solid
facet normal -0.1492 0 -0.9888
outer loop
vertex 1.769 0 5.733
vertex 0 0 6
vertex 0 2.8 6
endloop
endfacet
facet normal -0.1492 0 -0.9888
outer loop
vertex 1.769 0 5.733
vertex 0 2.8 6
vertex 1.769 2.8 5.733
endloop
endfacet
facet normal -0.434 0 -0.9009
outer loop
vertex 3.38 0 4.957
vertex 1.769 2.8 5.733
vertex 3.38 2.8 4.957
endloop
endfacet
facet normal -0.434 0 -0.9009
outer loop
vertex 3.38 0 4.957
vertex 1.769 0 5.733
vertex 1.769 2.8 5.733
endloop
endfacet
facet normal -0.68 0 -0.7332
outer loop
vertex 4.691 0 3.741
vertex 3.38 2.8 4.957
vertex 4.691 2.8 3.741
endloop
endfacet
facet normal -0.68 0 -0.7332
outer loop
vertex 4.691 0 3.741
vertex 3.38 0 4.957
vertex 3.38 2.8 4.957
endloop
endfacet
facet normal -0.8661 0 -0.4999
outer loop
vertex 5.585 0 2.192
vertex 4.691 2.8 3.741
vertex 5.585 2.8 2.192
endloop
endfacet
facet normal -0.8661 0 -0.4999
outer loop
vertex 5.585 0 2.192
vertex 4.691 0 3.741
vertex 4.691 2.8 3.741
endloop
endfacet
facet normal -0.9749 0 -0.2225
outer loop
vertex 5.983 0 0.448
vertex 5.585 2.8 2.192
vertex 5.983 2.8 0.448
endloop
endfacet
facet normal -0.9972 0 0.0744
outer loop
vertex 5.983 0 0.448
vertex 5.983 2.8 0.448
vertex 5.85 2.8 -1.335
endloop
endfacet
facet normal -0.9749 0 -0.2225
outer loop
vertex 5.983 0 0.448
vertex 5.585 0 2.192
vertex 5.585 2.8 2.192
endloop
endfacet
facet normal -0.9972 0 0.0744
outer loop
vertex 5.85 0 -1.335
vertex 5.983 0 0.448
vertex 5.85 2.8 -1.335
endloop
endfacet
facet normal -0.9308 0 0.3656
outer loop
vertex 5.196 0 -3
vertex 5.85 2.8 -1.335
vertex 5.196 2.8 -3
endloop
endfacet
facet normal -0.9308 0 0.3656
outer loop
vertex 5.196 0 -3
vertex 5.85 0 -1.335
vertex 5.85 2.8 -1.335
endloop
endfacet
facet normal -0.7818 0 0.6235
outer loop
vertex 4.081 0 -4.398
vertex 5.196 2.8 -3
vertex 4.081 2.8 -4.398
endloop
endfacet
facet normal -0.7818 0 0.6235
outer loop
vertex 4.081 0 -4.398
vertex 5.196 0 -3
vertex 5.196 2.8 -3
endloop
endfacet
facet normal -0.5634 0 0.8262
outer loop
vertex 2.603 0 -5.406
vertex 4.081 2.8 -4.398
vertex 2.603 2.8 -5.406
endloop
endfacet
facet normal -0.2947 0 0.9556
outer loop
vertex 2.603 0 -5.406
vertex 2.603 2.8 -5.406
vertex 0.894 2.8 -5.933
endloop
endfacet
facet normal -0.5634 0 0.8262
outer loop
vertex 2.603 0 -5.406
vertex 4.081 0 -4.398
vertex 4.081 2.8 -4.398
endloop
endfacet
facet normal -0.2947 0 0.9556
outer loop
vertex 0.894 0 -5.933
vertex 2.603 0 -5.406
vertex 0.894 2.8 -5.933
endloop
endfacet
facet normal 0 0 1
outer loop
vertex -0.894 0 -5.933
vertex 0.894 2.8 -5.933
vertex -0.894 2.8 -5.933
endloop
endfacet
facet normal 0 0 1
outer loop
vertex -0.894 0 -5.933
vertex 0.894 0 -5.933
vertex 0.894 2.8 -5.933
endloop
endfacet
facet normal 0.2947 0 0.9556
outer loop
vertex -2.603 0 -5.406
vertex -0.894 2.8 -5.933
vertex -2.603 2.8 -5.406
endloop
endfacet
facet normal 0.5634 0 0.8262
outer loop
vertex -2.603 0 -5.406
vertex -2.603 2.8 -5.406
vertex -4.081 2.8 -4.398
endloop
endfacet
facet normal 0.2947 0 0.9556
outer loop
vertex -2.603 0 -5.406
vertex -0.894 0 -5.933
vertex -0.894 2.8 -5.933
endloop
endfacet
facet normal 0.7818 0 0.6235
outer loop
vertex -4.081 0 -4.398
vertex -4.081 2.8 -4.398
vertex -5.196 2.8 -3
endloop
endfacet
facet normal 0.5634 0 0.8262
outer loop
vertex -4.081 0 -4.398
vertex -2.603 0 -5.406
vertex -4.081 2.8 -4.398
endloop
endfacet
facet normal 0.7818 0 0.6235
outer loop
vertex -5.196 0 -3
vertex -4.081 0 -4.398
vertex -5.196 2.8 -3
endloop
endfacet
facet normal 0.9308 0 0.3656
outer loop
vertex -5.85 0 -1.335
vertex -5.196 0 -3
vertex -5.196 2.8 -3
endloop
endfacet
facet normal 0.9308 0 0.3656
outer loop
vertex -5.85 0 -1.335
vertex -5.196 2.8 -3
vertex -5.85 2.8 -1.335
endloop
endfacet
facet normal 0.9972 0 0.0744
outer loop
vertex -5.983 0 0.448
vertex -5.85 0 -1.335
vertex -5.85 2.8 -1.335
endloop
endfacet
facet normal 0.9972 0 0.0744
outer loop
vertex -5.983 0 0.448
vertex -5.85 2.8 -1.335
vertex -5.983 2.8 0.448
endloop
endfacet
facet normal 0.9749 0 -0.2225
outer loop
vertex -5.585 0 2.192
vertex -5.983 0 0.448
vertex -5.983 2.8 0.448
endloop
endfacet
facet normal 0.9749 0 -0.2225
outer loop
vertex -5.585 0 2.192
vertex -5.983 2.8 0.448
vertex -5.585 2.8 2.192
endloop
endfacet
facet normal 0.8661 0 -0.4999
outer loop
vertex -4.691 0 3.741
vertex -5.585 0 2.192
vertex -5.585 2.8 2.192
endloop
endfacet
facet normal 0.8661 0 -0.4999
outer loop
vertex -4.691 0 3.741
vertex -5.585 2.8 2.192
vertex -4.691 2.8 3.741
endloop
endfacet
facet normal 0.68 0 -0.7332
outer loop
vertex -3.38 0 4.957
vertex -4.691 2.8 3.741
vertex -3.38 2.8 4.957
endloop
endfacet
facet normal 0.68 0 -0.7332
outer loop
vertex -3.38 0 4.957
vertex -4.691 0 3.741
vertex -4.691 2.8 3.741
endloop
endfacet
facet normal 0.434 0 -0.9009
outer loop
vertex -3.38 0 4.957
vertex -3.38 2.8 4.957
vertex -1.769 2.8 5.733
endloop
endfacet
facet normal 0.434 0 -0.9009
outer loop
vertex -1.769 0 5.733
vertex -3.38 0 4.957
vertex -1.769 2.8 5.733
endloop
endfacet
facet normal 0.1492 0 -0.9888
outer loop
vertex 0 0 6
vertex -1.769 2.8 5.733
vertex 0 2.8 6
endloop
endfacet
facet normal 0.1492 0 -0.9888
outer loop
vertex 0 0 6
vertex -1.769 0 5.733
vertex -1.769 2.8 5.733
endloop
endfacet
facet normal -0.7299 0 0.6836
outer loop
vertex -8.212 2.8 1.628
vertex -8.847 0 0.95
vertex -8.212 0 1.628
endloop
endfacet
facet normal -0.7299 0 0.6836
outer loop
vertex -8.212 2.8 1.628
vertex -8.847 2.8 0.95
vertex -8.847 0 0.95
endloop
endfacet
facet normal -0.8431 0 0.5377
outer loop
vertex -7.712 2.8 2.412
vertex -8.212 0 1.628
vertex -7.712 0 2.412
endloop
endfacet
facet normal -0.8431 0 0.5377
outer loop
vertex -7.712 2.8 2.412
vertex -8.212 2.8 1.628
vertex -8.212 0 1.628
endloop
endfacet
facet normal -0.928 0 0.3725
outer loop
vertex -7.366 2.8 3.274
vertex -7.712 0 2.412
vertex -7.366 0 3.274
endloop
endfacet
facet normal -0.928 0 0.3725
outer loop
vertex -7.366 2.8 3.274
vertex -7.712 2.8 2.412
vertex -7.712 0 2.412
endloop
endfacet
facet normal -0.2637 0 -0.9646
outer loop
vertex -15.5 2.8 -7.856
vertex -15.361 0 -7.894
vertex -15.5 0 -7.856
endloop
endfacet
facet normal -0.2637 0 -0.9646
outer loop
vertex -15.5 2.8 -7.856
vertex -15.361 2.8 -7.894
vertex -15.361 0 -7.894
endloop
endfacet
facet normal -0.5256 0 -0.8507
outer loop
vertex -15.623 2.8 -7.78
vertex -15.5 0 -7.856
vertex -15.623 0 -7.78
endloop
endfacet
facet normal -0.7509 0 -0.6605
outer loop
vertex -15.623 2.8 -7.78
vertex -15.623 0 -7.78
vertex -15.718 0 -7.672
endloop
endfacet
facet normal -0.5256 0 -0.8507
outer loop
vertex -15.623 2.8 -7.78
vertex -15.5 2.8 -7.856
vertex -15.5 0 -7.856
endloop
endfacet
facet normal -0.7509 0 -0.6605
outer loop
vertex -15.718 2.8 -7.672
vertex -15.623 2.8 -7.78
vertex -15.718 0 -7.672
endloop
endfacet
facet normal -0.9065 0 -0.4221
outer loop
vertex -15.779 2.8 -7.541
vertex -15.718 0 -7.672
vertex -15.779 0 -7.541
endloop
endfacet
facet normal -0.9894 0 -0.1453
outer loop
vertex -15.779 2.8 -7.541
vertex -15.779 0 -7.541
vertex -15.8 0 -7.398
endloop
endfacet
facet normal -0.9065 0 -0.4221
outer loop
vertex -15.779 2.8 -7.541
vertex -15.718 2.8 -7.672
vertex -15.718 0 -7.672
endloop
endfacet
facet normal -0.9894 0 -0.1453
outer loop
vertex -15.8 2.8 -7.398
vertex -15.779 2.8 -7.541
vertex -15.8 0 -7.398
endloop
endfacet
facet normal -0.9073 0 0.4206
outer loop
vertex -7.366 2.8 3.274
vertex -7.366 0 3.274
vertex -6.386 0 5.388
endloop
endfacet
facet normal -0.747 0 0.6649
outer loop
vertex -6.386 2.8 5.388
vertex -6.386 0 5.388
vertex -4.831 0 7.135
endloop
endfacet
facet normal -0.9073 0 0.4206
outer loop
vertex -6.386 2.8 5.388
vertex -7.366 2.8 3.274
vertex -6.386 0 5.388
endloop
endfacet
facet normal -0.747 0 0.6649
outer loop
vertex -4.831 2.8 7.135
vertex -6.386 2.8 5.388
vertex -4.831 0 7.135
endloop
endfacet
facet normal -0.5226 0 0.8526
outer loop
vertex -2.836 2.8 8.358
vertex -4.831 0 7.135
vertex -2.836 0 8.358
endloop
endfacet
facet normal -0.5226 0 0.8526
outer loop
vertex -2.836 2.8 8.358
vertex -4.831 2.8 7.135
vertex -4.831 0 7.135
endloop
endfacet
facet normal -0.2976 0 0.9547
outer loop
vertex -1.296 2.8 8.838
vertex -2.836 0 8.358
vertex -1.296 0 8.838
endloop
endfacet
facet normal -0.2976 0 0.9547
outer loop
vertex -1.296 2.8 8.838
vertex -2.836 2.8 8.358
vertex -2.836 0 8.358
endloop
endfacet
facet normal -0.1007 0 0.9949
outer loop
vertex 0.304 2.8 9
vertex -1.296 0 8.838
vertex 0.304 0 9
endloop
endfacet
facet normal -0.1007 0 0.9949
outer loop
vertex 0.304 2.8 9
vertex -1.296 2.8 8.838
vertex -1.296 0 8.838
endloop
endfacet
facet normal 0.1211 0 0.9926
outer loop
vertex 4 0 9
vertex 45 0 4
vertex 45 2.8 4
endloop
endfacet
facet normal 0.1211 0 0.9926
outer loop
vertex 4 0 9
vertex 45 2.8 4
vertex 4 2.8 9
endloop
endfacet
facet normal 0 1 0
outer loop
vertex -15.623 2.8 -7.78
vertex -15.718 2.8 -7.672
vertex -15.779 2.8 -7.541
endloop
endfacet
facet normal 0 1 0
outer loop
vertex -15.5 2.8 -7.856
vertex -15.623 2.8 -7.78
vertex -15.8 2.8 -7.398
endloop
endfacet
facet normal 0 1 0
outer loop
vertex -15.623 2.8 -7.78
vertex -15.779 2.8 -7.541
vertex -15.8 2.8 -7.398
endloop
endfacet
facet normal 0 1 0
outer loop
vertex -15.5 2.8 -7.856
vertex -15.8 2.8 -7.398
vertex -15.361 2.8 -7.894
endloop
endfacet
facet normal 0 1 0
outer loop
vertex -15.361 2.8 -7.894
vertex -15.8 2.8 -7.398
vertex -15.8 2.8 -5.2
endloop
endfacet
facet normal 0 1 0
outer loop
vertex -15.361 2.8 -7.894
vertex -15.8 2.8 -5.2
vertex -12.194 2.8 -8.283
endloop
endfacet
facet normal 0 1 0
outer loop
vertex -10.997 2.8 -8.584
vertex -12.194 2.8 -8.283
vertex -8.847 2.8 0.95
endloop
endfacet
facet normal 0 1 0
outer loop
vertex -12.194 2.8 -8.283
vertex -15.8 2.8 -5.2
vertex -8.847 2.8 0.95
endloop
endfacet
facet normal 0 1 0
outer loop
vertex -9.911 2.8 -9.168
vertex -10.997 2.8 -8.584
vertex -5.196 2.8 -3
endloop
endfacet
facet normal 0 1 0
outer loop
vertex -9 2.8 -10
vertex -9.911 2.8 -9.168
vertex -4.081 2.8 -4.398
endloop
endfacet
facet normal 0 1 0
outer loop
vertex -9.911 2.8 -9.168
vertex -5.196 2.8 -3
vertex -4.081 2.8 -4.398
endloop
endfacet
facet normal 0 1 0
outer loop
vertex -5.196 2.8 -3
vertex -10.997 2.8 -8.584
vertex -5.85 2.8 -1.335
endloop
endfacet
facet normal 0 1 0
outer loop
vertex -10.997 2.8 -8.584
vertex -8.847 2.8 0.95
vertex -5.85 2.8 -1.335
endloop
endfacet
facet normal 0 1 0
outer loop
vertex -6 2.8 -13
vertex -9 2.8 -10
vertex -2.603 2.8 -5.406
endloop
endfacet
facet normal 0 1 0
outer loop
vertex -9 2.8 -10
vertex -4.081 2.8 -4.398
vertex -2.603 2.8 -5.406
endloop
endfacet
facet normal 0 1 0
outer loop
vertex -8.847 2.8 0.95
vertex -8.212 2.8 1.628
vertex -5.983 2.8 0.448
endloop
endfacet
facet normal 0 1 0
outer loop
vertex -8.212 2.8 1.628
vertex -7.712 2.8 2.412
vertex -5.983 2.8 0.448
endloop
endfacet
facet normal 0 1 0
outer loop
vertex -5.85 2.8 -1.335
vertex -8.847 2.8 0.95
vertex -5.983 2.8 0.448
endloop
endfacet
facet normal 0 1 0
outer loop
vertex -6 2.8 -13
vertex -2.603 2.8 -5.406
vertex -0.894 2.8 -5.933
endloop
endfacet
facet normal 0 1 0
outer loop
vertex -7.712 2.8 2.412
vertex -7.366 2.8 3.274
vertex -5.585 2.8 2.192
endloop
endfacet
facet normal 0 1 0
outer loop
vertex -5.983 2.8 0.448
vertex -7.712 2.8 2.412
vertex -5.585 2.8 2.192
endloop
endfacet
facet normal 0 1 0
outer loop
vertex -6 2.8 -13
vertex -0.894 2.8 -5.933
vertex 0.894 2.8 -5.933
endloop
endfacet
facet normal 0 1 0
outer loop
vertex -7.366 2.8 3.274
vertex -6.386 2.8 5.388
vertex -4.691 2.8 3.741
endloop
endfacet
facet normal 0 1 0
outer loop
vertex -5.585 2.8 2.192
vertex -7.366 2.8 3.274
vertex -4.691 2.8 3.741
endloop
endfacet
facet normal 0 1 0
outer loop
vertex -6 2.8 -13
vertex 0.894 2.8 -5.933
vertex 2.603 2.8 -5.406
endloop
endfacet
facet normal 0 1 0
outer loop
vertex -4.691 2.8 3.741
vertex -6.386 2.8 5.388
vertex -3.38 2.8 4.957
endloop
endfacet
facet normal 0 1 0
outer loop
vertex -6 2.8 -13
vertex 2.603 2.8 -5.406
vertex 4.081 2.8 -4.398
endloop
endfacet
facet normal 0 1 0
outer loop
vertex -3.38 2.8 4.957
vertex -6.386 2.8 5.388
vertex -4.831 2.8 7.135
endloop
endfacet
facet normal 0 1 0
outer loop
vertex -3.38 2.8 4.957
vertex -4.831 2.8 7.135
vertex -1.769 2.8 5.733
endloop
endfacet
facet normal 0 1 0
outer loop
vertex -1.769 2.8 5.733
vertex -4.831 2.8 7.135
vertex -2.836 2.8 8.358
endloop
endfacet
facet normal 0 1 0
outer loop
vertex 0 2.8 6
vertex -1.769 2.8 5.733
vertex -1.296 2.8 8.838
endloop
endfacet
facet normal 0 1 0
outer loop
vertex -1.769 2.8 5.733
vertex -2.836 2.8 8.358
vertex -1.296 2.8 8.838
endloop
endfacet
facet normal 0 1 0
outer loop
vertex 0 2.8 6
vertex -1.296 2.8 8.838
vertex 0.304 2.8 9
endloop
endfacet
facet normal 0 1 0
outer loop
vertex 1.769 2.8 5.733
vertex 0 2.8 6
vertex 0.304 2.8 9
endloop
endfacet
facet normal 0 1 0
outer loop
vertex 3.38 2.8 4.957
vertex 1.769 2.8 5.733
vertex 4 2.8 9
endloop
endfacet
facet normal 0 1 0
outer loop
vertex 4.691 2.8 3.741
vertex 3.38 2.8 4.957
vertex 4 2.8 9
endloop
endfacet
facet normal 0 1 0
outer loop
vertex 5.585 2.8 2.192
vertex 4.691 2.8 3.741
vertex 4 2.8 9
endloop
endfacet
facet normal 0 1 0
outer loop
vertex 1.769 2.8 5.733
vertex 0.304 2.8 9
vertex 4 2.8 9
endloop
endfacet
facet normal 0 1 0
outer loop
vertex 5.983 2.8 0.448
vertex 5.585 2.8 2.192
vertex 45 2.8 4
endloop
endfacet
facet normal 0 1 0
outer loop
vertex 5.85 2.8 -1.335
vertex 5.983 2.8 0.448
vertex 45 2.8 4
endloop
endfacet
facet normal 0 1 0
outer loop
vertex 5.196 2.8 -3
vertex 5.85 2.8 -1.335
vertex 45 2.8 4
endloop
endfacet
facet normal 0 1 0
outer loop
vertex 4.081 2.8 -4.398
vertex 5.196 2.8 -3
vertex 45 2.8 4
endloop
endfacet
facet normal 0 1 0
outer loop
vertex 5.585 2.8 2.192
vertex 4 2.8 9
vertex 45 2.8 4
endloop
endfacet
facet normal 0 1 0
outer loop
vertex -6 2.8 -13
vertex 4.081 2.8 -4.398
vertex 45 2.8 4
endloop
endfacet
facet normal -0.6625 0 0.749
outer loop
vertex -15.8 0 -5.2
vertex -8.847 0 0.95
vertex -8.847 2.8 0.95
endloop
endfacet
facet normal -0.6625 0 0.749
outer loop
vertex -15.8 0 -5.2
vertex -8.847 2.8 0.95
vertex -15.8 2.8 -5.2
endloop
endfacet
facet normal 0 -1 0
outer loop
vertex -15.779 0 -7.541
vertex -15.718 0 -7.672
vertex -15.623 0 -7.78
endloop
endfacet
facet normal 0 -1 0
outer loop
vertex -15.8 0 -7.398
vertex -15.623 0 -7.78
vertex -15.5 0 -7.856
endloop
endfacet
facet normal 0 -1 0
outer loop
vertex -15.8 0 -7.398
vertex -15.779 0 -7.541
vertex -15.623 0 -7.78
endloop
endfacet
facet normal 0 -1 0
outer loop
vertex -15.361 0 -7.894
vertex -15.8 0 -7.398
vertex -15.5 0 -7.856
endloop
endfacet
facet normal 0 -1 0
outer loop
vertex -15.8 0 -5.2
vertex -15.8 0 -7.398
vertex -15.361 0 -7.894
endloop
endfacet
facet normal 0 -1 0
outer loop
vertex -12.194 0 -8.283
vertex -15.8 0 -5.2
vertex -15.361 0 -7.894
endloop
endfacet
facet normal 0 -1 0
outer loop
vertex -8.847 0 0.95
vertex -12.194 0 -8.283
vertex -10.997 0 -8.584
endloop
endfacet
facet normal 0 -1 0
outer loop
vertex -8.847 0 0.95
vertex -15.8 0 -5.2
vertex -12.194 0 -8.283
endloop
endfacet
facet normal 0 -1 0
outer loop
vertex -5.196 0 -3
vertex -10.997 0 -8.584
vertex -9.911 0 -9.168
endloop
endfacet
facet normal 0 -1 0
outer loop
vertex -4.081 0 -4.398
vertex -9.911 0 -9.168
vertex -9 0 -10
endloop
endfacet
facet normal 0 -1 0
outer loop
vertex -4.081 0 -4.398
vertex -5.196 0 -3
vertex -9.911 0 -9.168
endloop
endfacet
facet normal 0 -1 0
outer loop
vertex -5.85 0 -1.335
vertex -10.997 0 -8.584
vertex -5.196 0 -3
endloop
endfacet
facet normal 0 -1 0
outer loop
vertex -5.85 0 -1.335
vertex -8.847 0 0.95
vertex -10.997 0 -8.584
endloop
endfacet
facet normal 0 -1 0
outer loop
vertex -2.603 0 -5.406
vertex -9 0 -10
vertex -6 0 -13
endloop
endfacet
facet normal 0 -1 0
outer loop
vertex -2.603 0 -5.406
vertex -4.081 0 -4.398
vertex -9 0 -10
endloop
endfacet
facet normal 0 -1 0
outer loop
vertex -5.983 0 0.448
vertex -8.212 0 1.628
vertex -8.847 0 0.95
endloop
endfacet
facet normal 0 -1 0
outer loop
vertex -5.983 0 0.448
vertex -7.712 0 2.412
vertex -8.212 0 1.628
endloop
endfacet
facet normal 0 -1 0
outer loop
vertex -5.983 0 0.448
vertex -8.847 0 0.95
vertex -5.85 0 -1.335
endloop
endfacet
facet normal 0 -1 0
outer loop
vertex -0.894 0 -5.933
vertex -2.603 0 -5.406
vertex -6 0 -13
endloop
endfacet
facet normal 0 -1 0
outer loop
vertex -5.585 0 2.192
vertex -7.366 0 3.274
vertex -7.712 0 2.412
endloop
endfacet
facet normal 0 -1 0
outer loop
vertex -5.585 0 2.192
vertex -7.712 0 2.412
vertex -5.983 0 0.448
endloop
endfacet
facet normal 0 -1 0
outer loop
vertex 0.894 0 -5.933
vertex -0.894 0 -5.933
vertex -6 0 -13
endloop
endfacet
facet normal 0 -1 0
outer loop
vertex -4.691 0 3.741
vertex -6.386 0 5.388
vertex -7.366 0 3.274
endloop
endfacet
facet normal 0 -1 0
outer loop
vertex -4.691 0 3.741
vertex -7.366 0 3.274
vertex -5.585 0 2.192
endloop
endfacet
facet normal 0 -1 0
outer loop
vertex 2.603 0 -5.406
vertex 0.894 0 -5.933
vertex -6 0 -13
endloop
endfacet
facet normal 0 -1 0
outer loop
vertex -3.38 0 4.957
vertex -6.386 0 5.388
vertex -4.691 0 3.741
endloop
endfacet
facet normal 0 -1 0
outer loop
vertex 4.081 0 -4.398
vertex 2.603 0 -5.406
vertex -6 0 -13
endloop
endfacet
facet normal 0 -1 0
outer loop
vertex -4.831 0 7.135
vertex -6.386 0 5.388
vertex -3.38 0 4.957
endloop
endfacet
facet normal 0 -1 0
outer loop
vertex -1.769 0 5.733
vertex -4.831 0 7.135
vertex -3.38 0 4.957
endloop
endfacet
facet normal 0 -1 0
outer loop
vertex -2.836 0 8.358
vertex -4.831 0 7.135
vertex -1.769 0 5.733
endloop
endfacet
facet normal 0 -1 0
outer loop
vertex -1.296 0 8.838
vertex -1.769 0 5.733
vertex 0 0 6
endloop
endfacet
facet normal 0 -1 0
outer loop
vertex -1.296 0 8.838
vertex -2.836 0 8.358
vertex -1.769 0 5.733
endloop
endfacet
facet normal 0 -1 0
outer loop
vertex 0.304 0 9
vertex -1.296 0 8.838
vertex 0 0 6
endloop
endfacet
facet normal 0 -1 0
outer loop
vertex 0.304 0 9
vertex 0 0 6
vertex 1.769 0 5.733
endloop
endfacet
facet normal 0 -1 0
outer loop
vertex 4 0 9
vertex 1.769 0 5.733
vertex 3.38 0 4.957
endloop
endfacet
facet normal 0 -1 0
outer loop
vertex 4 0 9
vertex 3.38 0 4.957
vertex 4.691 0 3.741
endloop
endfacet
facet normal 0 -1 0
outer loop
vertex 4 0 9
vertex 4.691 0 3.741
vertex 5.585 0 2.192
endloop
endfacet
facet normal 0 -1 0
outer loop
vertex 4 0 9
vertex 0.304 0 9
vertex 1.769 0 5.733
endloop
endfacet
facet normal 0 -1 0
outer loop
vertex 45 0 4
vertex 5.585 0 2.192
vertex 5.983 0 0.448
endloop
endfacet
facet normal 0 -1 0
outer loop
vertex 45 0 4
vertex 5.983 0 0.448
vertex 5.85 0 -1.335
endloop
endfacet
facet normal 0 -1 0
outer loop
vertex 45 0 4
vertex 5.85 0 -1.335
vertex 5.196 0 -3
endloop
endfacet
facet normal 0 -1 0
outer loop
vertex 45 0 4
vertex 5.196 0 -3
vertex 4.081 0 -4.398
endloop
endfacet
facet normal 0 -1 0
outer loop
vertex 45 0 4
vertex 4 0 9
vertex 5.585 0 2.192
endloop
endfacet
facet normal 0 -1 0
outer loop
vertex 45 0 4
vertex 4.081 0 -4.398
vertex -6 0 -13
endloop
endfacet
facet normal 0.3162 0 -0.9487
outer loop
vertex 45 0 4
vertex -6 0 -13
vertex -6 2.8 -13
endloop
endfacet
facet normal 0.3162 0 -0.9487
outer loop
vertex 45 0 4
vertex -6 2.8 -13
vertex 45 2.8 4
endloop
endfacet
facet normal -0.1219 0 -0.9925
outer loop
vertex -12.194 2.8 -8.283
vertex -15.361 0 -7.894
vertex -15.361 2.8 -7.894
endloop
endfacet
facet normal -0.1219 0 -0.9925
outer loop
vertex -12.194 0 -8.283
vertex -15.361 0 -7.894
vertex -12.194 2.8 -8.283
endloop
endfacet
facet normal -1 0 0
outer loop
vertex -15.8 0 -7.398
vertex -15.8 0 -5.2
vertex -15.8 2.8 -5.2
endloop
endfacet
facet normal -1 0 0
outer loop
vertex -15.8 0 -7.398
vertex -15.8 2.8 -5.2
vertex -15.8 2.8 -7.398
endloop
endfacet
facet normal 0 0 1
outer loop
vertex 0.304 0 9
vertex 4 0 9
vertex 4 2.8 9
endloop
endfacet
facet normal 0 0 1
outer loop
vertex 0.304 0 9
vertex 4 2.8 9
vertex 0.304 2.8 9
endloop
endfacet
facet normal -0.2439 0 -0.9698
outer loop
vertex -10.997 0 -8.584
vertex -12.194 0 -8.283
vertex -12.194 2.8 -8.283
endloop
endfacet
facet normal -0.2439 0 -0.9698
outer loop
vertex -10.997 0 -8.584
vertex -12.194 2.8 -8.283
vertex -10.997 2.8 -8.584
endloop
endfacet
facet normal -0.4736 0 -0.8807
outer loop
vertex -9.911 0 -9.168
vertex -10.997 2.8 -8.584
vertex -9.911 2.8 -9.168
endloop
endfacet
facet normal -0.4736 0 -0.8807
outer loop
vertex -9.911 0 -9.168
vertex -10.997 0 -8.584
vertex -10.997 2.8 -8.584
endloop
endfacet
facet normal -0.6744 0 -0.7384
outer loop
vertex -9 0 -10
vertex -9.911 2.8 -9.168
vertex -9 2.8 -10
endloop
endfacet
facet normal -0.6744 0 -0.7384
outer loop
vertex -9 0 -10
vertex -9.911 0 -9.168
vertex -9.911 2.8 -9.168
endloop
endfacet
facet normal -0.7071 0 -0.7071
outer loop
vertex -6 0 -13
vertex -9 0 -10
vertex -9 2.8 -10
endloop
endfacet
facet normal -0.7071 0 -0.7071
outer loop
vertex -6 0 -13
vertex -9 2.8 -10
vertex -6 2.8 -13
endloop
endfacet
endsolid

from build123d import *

# Parameters (mm, degrees)
SKETCH1_R           = 6
BOSS_EXTRUDE1_DEPTH = 2.8
CHAMFER1_SIZE       = 0.859491926
CHAMFER1_SIZE_2     = 7
FILLET4_R           = 5
FILLET5_R           = 0.5
FILLET10_R          = 5
FILLET11_R          = 8


with BuildPart() as part:
    # Sketch1 → Boss-Extrude1 (new body)
    with BuildSketch(Plane(origin=(0, 0, 0), x_dir=(1, 0, 0), z_dir=(0, 1, 0))):
        Polygon((-9, 10), (-6, 13), (45, -4), (4, -9), (-6, -9), (-7.660869565, -2), (-15.8, 5.2), (-15.8, 8.7), (-9, 8.7), align=None)
        with Locations(Location((0, 0, 0), (0, 0, 270))):
            Circle(SKETCH1_R, mode=Mode.SUBTRACT)
    extrude(amount=BOSS_EXTRUDE1_DEPTH)

    # Chamfer1
    # the kernel refuses this chamfer: 7, 0.859491926 mm, written as the material it takes off along each edge
    with BuildSketch(Plane(origin=(-15.8, -18.194982295, -8.7), x_dir=(-0.29696840376135825, 0, 0.9548873060039236), z_dir=(0, 1, 0))) as chamfer1_piece_1_section:
        Polygon((CHAMFER1_SIZE * 0.95488730636, CHAMFER1_SIZE * 0.296968403872), (-CHAMFER1_SIZE_2 * 0.296968403761, CHAMFER1_SIZE_2 * 0.954887306004), (0, 0), align=None)
    chamfer1_piece_1 = extrude(amount=39.18996459, mode=Mode.PRIVATE)
    chamfer1_piece_1 = split(chamfer1_piece_1, bisect_by=Plane(origin=(-9, 1.4, -8.488844691), z_dir=(-1, 0, 0)), keep=Keep.TOP, mode=Mode.PRIVATE)
    add(chamfer1_piece_1, mode=Mode.SUBTRACT)

    # Fillet4
    # the kernel refuses this fillet: 5 mm, written as the material it adds along each edge
    with BuildSketch(Plane(origin=(-9, 0, -8.675443088), x_dir=(-0.9925461516413187, 0, 0.12186934340517559), z_dir=(0, 1, 0))) as fillet4_piece_1:
        with BuildLine():
            CenterArc((3.217696086, -5), FILLET4_R, 90, 42.518155203)
            Line((-0.161422881, -1.314683866), (-0.229005261, -1.240977543))
            ThreePointArc((-0.229005261, -1.240977543), (-0.179966056, -0.645154999), (-0.099254615, 0.012186934))
            Line((-0.099254615, 0.012186934), (0, 0.1))
            Line((0, 0.1), (3.217696086, 0.1))
            Line((3.217696086, 0.1), (3.217696086, 0))
        make_face()
    extrude(amount=2.8)

    # Fillet5
    fillet5_edges = [part.edges().sort_by_distance(p)[0] for p in [
        (-15.8, 1.4, -7.840508074),
    ]]
    fillet(fillet5_edges, radius=FILLET5_R)

    # Fillet10
    fillet10_edges = [part.edges().sort_by_distance(p)[0] for p in [
        (-7.660869565, 1.4, 2),
    ]]
    fillet(fillet10_edges, radius=FILLET10_R)

    # Fillet11
    fillet11_edges = [part.edges().sort_by_distance(p)[0] for p in [
        (-6, 1.4, 9),
    ]]
    fillet(fillet11_edges, radius=FILLET11_R)


solid = part.part
